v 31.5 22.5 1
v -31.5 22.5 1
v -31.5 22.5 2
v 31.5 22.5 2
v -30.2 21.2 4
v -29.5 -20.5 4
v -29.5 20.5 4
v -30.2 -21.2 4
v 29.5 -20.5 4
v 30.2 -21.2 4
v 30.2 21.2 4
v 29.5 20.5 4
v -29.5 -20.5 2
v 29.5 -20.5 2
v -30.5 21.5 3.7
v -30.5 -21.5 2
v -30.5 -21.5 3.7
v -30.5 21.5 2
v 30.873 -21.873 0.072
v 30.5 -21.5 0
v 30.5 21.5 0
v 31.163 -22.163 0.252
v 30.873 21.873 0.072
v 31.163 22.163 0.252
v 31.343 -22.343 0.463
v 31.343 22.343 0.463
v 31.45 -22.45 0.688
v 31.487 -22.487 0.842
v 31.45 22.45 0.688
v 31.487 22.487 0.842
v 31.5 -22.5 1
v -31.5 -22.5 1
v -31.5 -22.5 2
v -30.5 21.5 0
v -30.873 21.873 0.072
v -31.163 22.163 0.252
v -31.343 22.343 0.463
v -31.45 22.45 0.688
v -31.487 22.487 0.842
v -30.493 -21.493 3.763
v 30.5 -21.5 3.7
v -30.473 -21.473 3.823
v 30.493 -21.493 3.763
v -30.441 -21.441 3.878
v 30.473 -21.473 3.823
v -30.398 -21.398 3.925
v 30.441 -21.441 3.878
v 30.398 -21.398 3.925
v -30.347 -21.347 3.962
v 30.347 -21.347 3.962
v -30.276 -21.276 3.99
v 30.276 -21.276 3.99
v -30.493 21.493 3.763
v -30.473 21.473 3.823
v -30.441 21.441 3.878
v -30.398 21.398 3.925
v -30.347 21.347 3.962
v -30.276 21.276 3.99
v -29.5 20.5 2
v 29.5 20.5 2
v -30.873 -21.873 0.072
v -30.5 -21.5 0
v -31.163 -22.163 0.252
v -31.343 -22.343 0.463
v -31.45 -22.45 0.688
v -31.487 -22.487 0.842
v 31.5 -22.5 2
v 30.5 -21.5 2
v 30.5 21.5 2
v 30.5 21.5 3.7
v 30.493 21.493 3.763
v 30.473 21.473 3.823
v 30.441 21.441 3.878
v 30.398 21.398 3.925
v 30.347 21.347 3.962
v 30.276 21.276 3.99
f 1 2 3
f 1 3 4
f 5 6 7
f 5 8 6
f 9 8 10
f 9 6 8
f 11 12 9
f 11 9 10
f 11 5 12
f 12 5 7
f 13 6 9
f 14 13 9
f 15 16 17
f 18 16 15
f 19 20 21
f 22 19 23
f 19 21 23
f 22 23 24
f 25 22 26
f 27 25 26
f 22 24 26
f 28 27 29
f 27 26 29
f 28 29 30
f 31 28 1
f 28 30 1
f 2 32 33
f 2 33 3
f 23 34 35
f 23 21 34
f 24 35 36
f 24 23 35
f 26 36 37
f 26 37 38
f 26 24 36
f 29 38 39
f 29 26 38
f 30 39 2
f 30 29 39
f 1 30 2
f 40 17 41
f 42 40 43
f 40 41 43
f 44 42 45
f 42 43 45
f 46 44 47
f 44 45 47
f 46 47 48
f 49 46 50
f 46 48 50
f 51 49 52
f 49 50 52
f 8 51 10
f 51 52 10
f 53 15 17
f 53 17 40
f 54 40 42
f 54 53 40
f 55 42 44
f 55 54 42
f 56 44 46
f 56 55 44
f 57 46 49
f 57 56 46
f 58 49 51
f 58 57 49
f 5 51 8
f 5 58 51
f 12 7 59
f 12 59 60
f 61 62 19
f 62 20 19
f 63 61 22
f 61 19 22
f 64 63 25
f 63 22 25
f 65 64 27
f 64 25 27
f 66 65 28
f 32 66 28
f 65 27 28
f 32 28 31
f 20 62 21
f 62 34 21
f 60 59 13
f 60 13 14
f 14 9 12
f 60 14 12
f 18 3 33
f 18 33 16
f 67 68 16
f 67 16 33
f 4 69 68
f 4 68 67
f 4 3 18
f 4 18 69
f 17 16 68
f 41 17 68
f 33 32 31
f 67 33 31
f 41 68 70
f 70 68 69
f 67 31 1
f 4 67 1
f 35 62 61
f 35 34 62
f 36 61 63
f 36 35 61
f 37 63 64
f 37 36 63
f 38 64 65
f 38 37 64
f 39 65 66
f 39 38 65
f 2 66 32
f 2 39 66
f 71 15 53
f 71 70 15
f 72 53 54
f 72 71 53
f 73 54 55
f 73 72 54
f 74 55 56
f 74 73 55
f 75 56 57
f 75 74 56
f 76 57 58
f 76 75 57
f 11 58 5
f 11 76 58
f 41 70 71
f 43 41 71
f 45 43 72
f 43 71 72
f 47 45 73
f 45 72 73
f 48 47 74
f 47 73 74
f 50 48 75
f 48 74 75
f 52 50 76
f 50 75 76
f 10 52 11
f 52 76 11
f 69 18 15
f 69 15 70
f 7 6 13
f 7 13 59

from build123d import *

# Parameters (mm, degrees)
SKETCH_W     = 63
SKETCH_H     = 45
PAD_DEPTH    = 2
SKETCH002_W  = 61
SKETCH002_H  = 43
PAD001_DEPTH = 4
SKETCH003_W  = 59
SKETCH003_H  = 41
POCKET_DEPTH = 2
FILLET_R     = 1
FILLET001_R  = 0.3


with BuildPart() as part:
    # Sketch → Pad (new body)
    with BuildSketch(Plane.XY):
        Rectangle(SKETCH_W, SKETCH_H)
    extrude(amount=PAD_DEPTH)

    # Sketch002 → Pad001 (join)
    with BuildSketch(Plane.XY):
        Rectangle(SKETCH002_W, SKETCH002_H)
    extrude(amount=PAD001_DEPTH)

    # Sketch003 → Pocket (cut)
    with BuildSketch(Plane.XY.offset(4)):
        Rectangle(SKETCH003_W, SKETCH003_H)
    extrude(amount=-POCKET_DEPTH, mode=Mode.SUBTRACT)

    # Fillet
    fillet_edges = [part.edges().sort_by_distance(p)[0] for p in [
        (0, -22.5, 0),
        (31.5, 0, 0),
        (-31.5, 0, 0),
        (0, 22.5, 0),
    ]]
    fillet(fillet_edges, radius=FILLET_R)

    # Fillet001
    fillet001_edges = [part.edges().sort_by_distance(p)[0] for p in [
        (30.5, 0, 4),
        (0, 21.5, 4),
        (0, -21.5, 4),
        (-30.5, 0, 4),
    ]]
    fillet(fillet001_edges, radius=FILLET001_R)


solid = part.part
